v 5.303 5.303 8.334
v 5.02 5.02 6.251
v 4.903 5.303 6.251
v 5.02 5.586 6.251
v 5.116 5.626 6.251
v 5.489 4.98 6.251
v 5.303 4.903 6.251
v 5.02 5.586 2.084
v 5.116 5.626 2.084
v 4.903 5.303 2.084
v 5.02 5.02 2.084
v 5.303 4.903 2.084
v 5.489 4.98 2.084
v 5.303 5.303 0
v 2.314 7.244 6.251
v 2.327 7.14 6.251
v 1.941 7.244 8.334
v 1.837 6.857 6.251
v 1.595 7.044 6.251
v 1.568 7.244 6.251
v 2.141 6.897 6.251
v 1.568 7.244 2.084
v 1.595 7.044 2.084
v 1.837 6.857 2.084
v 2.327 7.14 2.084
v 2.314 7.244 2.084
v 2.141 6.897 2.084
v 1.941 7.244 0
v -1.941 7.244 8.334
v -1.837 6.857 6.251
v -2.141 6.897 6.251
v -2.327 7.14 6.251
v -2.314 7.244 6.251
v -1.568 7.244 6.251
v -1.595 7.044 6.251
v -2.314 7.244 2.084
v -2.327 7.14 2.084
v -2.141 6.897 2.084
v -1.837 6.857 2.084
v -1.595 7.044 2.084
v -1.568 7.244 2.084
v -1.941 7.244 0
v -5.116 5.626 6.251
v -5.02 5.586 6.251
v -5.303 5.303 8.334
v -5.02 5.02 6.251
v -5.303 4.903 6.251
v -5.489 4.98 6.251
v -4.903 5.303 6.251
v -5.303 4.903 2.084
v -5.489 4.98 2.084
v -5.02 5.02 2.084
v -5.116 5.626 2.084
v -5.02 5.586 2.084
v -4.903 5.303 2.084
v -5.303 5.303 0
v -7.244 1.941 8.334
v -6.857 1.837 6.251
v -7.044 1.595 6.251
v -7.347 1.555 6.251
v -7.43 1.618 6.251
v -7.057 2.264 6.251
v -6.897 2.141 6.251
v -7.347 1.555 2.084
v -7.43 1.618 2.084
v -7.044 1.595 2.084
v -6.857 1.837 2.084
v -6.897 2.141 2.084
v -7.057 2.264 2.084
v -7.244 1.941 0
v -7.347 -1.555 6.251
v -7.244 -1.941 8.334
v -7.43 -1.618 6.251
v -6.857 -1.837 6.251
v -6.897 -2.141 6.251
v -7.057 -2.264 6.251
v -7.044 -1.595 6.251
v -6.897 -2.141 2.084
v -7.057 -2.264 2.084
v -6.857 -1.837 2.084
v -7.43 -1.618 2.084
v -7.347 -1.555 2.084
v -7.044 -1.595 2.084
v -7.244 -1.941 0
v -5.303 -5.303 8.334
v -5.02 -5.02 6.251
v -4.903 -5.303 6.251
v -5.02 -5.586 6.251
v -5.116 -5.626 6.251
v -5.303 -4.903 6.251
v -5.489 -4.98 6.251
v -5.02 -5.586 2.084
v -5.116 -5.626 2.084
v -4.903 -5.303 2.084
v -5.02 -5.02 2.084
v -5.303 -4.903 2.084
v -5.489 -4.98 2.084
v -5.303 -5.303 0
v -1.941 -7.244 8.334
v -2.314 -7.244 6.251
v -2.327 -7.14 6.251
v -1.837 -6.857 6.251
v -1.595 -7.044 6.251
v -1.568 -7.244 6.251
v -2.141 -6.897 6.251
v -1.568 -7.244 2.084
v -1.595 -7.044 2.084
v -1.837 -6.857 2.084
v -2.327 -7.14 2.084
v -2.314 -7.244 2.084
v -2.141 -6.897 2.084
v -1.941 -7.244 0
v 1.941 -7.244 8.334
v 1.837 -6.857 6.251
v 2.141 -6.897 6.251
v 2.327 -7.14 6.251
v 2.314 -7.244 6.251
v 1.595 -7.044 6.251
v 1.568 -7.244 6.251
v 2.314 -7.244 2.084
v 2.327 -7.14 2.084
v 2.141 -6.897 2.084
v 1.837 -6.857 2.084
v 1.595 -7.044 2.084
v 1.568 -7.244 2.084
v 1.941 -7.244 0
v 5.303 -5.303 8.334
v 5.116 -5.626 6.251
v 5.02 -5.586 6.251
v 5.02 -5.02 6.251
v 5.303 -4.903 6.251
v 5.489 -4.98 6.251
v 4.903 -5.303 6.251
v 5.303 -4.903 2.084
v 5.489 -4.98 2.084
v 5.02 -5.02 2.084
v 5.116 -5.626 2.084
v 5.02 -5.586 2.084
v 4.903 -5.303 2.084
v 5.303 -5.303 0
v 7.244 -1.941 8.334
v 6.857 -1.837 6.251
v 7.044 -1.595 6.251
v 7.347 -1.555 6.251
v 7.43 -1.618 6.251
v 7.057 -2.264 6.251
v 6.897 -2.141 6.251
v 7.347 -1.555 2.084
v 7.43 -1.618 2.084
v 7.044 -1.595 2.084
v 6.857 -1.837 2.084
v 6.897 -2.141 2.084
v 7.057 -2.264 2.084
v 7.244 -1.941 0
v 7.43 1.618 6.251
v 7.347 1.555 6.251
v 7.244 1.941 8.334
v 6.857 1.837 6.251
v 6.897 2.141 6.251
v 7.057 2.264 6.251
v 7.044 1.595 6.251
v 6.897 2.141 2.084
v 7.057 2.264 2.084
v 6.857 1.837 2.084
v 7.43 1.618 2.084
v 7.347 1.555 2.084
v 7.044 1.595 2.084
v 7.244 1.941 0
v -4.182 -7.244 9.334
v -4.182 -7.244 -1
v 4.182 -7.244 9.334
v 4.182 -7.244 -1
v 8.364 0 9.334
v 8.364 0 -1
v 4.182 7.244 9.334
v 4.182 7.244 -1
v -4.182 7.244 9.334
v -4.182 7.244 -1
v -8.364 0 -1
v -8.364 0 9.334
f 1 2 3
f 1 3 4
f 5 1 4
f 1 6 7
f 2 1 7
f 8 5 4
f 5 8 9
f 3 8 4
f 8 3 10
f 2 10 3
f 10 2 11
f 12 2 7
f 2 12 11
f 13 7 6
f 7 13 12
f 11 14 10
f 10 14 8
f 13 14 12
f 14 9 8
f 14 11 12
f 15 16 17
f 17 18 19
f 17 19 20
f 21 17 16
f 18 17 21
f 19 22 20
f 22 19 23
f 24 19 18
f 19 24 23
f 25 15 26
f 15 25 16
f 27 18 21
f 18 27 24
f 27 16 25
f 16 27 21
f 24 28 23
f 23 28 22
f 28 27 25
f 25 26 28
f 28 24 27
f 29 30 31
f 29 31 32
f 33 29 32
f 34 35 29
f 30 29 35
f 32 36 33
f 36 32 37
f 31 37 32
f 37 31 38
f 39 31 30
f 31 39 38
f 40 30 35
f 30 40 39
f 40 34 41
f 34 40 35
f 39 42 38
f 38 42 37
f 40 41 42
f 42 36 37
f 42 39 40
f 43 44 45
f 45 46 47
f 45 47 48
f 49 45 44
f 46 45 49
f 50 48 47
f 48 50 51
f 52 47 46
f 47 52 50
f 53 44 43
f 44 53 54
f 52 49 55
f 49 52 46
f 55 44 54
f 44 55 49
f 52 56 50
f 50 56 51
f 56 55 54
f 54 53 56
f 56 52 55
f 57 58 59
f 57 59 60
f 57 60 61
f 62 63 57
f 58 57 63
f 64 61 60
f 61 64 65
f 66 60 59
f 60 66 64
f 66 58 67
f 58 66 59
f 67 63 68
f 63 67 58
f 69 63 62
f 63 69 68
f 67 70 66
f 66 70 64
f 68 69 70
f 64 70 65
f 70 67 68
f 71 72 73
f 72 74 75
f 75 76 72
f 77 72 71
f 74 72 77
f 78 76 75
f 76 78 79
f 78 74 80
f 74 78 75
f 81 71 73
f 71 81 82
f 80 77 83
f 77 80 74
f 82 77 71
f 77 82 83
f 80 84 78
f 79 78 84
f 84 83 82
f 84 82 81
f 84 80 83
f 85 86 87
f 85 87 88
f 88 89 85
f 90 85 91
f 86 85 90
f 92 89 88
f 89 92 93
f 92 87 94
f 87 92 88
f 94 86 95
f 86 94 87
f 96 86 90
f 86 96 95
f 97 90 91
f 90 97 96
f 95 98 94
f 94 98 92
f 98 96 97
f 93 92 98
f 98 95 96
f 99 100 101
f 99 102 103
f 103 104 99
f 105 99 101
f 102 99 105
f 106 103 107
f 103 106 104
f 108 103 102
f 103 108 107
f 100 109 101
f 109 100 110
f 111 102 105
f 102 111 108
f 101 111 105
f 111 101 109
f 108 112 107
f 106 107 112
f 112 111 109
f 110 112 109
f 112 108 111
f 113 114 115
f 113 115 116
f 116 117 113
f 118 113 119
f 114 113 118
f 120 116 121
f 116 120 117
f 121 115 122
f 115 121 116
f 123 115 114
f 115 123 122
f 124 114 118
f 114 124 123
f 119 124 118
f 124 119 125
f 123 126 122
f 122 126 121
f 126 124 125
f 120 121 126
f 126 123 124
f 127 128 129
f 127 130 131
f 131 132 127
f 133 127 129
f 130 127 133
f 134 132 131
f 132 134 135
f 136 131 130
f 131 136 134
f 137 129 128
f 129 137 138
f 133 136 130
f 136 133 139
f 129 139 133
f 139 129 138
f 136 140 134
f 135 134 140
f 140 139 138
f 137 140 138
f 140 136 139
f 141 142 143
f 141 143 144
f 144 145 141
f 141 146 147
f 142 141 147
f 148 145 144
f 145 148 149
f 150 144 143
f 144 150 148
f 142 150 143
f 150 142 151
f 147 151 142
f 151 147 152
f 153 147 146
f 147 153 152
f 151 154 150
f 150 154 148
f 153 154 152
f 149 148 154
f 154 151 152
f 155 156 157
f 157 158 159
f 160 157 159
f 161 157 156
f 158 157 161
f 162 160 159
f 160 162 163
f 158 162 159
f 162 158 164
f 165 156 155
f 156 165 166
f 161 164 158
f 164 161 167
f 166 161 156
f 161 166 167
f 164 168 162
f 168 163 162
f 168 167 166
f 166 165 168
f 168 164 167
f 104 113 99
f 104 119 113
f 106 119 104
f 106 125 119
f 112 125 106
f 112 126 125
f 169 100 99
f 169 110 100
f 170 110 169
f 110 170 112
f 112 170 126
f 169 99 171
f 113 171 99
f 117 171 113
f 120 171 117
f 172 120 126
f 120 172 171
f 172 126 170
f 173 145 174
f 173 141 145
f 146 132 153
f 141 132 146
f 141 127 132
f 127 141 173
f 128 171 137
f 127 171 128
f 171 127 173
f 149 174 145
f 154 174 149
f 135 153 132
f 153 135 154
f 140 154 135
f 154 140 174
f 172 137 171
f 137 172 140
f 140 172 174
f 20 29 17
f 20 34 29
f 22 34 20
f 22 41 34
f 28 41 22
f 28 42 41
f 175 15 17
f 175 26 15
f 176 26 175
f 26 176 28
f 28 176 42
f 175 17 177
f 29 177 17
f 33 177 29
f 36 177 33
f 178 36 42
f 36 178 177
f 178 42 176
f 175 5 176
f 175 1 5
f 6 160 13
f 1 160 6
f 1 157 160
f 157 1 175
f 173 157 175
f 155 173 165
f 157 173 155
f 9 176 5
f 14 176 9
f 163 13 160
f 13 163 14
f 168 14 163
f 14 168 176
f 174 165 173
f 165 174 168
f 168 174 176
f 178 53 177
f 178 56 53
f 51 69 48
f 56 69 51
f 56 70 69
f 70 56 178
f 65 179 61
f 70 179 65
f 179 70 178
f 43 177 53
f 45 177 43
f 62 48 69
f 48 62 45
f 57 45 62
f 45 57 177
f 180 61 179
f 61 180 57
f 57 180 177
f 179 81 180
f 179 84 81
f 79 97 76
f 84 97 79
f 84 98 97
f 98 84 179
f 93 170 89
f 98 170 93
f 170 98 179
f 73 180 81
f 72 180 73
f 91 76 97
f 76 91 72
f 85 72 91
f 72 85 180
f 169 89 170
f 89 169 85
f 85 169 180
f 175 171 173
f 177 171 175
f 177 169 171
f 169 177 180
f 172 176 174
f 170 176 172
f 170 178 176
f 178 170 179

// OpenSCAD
// file: units.scad
function inches_to_mm(inches) = inches * 25.4; //https://www.nist.gov/pml/weights-and-measures/si-units-length
// file: bearing_race_spline.scad
bearing_race_spline();

module bearing_race_spline(
    h = 10, 
    r = 1,
    taper = 2.5)
{
    cylinder_height = h - (taper * 2);
    
    translate([0,0,taper + cylinder_height])
    cylinder(h = taper, r1 = r, r2 = 0);
    
    translate([0,0,taper])
    cylinder(h = cylinder_height, r = r);
    
    cylinder(h = taper, r1 = 0, r2 = r);
}
// file: hex_nut_captive_hole.settings.scad
default_clearance = 0.1;
default_spline_qty = 12;
default_spline_depth = 0.4;
default_extra_margin_top = 1;
default_extra_margin_bottom = 1;
// file: hex_nut.table.scad
include <units.scad>;

function hex_nut_diameter(index) = hex_nut_data(index)[0];
function hex_nut_height(index) = hex_nut_data(index)[1];

// https://www.boltdepot.com/fastener-information/nuts-washers/us-nut-dimensions.aspx
function hex_nut_data(index) = 
    // diameter, height
    index == "1/4"  ? [inches_to_mm(7/16),  inches_to_mm(7/32)] : 
    index == "5/16" ? [inches_to_mm(1/2),   inches_to_mm(17/64)] :
    index == "3/8"  ? [inches_to_mm(9/16),  inches_to_mm(21/64)] :
    index == "7/16" ? [inches_to_mm(11/16), inches_to_mm(3/8)] :
    index == "1/2"  ? [inches_to_mm(3/4),   inches_to_mm(7/16)] :
    index == "9/16" ? [inches_to_mm(7/8),   inches_to_mm(31/64)] :
    index == "5/8"  ? [inches_to_mm(15/16), inches_to_mm(35/64)] :
    index == "3/4"  ? [inches_to_mm(1+(1/8)),  inches_to_mm(41/64)] :
    index == "7/8"  ? [inches_to_mm(1+(5/16)), inches_to_mm(3/4)] :
    index == "1"    ? [inches_to_mm(1+(1/2)),  inches_to_mm(55/64)] :
    "Error";
// file: polygon_captive_hole.scad
use <bearing_race_spline.scad>;

polygon_captive_hole(d = 30);

module polygon_captive_hole(
    sides = 6,
    h = 10, 
    r = undef,
    d = undef,    
    flat_r = undef,  
    flat_d = undef,
    spline_qty = 12,
    spline_depth = 0.5,
    extra_margin_bottom = 1,
    extra_margin_top = 1)
{
    sides_arc = (360 / sides);
    sides_half_arc = sides_arc / 2;
    splines_arc = (360 / spline_qty);
    splines_half_arc = splines_arc / 2;

    function r() = radius(r, d, flat_r, flat_d, sides);
    function d() = diameter(r, d, flat_r, flat_d, sides);
    function flat_r() = flat_radius(r, d, flat_r, flat_d, sides);
    function flat_d() = flat_diameter(r, d, flat_r, flat_d, sides);
    
    difference()
    {
        translate([0, 0, -extra_margin_bottom])
        cylinder(
            r = r(), 
            h = h + extra_margin_bottom + extra_margin_top, 
            $fn = sides);
            
        splines();
    }
    
    module splines()
    {        
        for (i = [1 : spline_qty])
        {
            angle = (i * splines_arc) + splines_half_arc;
            _spline(angle);
        }

        module _spline(angle)
        {
            half_arc_intersecting_radius = flat_r();
            right_triangle_angle = abs(sides_half_arc - (angle % sides_arc));
            
            distance_from_center = (right_triangle_angle)
                ? half_arc_intersecting_radius / cos(right_triangle_angle)
                : half_arc_intersecting_radius;

            rotate([0, 0, angle])
            translate([distance_from_center, 0, 0])
            bearing_race_spline(
                h = h, 
                r = spline_depth, 
                taper = h / 4, 
                $fn = 8);
        }
    }
}

function radius(r, d, fr, fd, sides) = 
    (r)  ? r : 
    (d)  ? radius_from_diameter(d) : 
    (fr) ? radius_from_flat_radius(fr, sides) : 
    (fd) ? radius_from_flat_diameter(fd, sides) : 
    undef;

function diameter(r, d, fr, fd, sides) = 
    (r)  ? diameter_from_radius(r) :
    (d)  ? d :
    (fr) ? diameter_from_flat_radius(fr, sides) :
    (fd) ? diameter_from_flat_diameter(fd, sides) :
    undef;

function flat_radius(r, d, fr, fd, sides) = 
    (r)  ? flat_radius_from_radius(r, sides) :
    (d)  ? flat_radius_from_diameter(d, sides) :
    (fr) ? fr :
    (fd) ? flat_radius_from_flat_diameter(fd) :
    undef;

function flat_diameter(r, d, fr, fd, sides) = 
    (r)  ? flat_diameter_from_radius(r, sides) :
    (d)  ? flat_diameter_from_diameter(d, sides) :
    (fr) ? flat_diameter_from_flat_radius(fr) :
    (fd) ? fd :     
    undef;

function radius_from_diameter(d) = d / 2;
function radius_from_flat_radius(fr, sides) = fr / cos(360 / sides / 2);
function radius_from_flat_diameter(fd, sides) = radius_from_flat_radius(fd / 2, sides);

function diameter_from_radius(r) = r * 2;
function diameter_from_flat_radius(fr, sides) = radius_from_flat_radius(fr, sides) * 2;
function diameter_from_flat_diameter(fd, sides) = radius_from_flat_radius(fd / 2, sides) * 2; 

function flat_radius_from_flat_diameter(fd) = fd / 2;
function flat_radius_from_radius(r, sides) = cos(360 / sides / 2) * r;
function flat_radius_from_diameter(d, sides) = flat_radius_from_radius(d / 2, sides);

function flat_diameter_from_flat_radius(fr) = fr * 2;
function flat_diameter_from_radius(r, sides) = flat_radius_from_radius(r, sides) * 2;
function flat_diameter_from_diameter(d, sides) = flat_radius_from_radius(d / 2, sides) * 2;
// main file
use <polygon_captive_hole.scad>;
include <hex_nut.table.scad>;
include <hex_nut_captive_hole.settings.scad>;

hex_nut_captive_hole();

module hex_nut_captive_hole(
    index = "3/8",
    h = undef,
    clearance = undef,
    spline_qty = undef,
    spline_depth = undef,
    extra_margin_bottom = undef,
    extra_margin_top = undef)
{

    function _h() = (h != undef) ? h : hex_nut_height(index);
    function _clearance() = (clearance != undef) ? clearance : default_clearance;
    function _spline_qty() = (spline_qty != undef) ? spline_qty : default_spline_qty;
    function _spline_depth() = (spline_depth != undef) ? spline_depth : default_spline_depth;
    function _extra_margin_bottom() = (extra_margin_bottom != undef) ? extra_margin_bottom : default_extra_margin_bottom;
    function _extra_margin_top() = (extra_margin_top != undef) ? extra_margin_top : default_extra_margin_top;
    
    flat_d = hex_nut_diameter(index) + (_clearance() * 2);

    polygon_captive_hole(
        sides = 6, 
        flat_d = flat_d,
        h = _h(),
        spline_qty = _spline_qty(),
        spline_depth = _spline_depth(),
        extra_margin_bottom = _extra_margin_bottom(),
        extra_margin_top = _extra_margin_top()
    );
}
